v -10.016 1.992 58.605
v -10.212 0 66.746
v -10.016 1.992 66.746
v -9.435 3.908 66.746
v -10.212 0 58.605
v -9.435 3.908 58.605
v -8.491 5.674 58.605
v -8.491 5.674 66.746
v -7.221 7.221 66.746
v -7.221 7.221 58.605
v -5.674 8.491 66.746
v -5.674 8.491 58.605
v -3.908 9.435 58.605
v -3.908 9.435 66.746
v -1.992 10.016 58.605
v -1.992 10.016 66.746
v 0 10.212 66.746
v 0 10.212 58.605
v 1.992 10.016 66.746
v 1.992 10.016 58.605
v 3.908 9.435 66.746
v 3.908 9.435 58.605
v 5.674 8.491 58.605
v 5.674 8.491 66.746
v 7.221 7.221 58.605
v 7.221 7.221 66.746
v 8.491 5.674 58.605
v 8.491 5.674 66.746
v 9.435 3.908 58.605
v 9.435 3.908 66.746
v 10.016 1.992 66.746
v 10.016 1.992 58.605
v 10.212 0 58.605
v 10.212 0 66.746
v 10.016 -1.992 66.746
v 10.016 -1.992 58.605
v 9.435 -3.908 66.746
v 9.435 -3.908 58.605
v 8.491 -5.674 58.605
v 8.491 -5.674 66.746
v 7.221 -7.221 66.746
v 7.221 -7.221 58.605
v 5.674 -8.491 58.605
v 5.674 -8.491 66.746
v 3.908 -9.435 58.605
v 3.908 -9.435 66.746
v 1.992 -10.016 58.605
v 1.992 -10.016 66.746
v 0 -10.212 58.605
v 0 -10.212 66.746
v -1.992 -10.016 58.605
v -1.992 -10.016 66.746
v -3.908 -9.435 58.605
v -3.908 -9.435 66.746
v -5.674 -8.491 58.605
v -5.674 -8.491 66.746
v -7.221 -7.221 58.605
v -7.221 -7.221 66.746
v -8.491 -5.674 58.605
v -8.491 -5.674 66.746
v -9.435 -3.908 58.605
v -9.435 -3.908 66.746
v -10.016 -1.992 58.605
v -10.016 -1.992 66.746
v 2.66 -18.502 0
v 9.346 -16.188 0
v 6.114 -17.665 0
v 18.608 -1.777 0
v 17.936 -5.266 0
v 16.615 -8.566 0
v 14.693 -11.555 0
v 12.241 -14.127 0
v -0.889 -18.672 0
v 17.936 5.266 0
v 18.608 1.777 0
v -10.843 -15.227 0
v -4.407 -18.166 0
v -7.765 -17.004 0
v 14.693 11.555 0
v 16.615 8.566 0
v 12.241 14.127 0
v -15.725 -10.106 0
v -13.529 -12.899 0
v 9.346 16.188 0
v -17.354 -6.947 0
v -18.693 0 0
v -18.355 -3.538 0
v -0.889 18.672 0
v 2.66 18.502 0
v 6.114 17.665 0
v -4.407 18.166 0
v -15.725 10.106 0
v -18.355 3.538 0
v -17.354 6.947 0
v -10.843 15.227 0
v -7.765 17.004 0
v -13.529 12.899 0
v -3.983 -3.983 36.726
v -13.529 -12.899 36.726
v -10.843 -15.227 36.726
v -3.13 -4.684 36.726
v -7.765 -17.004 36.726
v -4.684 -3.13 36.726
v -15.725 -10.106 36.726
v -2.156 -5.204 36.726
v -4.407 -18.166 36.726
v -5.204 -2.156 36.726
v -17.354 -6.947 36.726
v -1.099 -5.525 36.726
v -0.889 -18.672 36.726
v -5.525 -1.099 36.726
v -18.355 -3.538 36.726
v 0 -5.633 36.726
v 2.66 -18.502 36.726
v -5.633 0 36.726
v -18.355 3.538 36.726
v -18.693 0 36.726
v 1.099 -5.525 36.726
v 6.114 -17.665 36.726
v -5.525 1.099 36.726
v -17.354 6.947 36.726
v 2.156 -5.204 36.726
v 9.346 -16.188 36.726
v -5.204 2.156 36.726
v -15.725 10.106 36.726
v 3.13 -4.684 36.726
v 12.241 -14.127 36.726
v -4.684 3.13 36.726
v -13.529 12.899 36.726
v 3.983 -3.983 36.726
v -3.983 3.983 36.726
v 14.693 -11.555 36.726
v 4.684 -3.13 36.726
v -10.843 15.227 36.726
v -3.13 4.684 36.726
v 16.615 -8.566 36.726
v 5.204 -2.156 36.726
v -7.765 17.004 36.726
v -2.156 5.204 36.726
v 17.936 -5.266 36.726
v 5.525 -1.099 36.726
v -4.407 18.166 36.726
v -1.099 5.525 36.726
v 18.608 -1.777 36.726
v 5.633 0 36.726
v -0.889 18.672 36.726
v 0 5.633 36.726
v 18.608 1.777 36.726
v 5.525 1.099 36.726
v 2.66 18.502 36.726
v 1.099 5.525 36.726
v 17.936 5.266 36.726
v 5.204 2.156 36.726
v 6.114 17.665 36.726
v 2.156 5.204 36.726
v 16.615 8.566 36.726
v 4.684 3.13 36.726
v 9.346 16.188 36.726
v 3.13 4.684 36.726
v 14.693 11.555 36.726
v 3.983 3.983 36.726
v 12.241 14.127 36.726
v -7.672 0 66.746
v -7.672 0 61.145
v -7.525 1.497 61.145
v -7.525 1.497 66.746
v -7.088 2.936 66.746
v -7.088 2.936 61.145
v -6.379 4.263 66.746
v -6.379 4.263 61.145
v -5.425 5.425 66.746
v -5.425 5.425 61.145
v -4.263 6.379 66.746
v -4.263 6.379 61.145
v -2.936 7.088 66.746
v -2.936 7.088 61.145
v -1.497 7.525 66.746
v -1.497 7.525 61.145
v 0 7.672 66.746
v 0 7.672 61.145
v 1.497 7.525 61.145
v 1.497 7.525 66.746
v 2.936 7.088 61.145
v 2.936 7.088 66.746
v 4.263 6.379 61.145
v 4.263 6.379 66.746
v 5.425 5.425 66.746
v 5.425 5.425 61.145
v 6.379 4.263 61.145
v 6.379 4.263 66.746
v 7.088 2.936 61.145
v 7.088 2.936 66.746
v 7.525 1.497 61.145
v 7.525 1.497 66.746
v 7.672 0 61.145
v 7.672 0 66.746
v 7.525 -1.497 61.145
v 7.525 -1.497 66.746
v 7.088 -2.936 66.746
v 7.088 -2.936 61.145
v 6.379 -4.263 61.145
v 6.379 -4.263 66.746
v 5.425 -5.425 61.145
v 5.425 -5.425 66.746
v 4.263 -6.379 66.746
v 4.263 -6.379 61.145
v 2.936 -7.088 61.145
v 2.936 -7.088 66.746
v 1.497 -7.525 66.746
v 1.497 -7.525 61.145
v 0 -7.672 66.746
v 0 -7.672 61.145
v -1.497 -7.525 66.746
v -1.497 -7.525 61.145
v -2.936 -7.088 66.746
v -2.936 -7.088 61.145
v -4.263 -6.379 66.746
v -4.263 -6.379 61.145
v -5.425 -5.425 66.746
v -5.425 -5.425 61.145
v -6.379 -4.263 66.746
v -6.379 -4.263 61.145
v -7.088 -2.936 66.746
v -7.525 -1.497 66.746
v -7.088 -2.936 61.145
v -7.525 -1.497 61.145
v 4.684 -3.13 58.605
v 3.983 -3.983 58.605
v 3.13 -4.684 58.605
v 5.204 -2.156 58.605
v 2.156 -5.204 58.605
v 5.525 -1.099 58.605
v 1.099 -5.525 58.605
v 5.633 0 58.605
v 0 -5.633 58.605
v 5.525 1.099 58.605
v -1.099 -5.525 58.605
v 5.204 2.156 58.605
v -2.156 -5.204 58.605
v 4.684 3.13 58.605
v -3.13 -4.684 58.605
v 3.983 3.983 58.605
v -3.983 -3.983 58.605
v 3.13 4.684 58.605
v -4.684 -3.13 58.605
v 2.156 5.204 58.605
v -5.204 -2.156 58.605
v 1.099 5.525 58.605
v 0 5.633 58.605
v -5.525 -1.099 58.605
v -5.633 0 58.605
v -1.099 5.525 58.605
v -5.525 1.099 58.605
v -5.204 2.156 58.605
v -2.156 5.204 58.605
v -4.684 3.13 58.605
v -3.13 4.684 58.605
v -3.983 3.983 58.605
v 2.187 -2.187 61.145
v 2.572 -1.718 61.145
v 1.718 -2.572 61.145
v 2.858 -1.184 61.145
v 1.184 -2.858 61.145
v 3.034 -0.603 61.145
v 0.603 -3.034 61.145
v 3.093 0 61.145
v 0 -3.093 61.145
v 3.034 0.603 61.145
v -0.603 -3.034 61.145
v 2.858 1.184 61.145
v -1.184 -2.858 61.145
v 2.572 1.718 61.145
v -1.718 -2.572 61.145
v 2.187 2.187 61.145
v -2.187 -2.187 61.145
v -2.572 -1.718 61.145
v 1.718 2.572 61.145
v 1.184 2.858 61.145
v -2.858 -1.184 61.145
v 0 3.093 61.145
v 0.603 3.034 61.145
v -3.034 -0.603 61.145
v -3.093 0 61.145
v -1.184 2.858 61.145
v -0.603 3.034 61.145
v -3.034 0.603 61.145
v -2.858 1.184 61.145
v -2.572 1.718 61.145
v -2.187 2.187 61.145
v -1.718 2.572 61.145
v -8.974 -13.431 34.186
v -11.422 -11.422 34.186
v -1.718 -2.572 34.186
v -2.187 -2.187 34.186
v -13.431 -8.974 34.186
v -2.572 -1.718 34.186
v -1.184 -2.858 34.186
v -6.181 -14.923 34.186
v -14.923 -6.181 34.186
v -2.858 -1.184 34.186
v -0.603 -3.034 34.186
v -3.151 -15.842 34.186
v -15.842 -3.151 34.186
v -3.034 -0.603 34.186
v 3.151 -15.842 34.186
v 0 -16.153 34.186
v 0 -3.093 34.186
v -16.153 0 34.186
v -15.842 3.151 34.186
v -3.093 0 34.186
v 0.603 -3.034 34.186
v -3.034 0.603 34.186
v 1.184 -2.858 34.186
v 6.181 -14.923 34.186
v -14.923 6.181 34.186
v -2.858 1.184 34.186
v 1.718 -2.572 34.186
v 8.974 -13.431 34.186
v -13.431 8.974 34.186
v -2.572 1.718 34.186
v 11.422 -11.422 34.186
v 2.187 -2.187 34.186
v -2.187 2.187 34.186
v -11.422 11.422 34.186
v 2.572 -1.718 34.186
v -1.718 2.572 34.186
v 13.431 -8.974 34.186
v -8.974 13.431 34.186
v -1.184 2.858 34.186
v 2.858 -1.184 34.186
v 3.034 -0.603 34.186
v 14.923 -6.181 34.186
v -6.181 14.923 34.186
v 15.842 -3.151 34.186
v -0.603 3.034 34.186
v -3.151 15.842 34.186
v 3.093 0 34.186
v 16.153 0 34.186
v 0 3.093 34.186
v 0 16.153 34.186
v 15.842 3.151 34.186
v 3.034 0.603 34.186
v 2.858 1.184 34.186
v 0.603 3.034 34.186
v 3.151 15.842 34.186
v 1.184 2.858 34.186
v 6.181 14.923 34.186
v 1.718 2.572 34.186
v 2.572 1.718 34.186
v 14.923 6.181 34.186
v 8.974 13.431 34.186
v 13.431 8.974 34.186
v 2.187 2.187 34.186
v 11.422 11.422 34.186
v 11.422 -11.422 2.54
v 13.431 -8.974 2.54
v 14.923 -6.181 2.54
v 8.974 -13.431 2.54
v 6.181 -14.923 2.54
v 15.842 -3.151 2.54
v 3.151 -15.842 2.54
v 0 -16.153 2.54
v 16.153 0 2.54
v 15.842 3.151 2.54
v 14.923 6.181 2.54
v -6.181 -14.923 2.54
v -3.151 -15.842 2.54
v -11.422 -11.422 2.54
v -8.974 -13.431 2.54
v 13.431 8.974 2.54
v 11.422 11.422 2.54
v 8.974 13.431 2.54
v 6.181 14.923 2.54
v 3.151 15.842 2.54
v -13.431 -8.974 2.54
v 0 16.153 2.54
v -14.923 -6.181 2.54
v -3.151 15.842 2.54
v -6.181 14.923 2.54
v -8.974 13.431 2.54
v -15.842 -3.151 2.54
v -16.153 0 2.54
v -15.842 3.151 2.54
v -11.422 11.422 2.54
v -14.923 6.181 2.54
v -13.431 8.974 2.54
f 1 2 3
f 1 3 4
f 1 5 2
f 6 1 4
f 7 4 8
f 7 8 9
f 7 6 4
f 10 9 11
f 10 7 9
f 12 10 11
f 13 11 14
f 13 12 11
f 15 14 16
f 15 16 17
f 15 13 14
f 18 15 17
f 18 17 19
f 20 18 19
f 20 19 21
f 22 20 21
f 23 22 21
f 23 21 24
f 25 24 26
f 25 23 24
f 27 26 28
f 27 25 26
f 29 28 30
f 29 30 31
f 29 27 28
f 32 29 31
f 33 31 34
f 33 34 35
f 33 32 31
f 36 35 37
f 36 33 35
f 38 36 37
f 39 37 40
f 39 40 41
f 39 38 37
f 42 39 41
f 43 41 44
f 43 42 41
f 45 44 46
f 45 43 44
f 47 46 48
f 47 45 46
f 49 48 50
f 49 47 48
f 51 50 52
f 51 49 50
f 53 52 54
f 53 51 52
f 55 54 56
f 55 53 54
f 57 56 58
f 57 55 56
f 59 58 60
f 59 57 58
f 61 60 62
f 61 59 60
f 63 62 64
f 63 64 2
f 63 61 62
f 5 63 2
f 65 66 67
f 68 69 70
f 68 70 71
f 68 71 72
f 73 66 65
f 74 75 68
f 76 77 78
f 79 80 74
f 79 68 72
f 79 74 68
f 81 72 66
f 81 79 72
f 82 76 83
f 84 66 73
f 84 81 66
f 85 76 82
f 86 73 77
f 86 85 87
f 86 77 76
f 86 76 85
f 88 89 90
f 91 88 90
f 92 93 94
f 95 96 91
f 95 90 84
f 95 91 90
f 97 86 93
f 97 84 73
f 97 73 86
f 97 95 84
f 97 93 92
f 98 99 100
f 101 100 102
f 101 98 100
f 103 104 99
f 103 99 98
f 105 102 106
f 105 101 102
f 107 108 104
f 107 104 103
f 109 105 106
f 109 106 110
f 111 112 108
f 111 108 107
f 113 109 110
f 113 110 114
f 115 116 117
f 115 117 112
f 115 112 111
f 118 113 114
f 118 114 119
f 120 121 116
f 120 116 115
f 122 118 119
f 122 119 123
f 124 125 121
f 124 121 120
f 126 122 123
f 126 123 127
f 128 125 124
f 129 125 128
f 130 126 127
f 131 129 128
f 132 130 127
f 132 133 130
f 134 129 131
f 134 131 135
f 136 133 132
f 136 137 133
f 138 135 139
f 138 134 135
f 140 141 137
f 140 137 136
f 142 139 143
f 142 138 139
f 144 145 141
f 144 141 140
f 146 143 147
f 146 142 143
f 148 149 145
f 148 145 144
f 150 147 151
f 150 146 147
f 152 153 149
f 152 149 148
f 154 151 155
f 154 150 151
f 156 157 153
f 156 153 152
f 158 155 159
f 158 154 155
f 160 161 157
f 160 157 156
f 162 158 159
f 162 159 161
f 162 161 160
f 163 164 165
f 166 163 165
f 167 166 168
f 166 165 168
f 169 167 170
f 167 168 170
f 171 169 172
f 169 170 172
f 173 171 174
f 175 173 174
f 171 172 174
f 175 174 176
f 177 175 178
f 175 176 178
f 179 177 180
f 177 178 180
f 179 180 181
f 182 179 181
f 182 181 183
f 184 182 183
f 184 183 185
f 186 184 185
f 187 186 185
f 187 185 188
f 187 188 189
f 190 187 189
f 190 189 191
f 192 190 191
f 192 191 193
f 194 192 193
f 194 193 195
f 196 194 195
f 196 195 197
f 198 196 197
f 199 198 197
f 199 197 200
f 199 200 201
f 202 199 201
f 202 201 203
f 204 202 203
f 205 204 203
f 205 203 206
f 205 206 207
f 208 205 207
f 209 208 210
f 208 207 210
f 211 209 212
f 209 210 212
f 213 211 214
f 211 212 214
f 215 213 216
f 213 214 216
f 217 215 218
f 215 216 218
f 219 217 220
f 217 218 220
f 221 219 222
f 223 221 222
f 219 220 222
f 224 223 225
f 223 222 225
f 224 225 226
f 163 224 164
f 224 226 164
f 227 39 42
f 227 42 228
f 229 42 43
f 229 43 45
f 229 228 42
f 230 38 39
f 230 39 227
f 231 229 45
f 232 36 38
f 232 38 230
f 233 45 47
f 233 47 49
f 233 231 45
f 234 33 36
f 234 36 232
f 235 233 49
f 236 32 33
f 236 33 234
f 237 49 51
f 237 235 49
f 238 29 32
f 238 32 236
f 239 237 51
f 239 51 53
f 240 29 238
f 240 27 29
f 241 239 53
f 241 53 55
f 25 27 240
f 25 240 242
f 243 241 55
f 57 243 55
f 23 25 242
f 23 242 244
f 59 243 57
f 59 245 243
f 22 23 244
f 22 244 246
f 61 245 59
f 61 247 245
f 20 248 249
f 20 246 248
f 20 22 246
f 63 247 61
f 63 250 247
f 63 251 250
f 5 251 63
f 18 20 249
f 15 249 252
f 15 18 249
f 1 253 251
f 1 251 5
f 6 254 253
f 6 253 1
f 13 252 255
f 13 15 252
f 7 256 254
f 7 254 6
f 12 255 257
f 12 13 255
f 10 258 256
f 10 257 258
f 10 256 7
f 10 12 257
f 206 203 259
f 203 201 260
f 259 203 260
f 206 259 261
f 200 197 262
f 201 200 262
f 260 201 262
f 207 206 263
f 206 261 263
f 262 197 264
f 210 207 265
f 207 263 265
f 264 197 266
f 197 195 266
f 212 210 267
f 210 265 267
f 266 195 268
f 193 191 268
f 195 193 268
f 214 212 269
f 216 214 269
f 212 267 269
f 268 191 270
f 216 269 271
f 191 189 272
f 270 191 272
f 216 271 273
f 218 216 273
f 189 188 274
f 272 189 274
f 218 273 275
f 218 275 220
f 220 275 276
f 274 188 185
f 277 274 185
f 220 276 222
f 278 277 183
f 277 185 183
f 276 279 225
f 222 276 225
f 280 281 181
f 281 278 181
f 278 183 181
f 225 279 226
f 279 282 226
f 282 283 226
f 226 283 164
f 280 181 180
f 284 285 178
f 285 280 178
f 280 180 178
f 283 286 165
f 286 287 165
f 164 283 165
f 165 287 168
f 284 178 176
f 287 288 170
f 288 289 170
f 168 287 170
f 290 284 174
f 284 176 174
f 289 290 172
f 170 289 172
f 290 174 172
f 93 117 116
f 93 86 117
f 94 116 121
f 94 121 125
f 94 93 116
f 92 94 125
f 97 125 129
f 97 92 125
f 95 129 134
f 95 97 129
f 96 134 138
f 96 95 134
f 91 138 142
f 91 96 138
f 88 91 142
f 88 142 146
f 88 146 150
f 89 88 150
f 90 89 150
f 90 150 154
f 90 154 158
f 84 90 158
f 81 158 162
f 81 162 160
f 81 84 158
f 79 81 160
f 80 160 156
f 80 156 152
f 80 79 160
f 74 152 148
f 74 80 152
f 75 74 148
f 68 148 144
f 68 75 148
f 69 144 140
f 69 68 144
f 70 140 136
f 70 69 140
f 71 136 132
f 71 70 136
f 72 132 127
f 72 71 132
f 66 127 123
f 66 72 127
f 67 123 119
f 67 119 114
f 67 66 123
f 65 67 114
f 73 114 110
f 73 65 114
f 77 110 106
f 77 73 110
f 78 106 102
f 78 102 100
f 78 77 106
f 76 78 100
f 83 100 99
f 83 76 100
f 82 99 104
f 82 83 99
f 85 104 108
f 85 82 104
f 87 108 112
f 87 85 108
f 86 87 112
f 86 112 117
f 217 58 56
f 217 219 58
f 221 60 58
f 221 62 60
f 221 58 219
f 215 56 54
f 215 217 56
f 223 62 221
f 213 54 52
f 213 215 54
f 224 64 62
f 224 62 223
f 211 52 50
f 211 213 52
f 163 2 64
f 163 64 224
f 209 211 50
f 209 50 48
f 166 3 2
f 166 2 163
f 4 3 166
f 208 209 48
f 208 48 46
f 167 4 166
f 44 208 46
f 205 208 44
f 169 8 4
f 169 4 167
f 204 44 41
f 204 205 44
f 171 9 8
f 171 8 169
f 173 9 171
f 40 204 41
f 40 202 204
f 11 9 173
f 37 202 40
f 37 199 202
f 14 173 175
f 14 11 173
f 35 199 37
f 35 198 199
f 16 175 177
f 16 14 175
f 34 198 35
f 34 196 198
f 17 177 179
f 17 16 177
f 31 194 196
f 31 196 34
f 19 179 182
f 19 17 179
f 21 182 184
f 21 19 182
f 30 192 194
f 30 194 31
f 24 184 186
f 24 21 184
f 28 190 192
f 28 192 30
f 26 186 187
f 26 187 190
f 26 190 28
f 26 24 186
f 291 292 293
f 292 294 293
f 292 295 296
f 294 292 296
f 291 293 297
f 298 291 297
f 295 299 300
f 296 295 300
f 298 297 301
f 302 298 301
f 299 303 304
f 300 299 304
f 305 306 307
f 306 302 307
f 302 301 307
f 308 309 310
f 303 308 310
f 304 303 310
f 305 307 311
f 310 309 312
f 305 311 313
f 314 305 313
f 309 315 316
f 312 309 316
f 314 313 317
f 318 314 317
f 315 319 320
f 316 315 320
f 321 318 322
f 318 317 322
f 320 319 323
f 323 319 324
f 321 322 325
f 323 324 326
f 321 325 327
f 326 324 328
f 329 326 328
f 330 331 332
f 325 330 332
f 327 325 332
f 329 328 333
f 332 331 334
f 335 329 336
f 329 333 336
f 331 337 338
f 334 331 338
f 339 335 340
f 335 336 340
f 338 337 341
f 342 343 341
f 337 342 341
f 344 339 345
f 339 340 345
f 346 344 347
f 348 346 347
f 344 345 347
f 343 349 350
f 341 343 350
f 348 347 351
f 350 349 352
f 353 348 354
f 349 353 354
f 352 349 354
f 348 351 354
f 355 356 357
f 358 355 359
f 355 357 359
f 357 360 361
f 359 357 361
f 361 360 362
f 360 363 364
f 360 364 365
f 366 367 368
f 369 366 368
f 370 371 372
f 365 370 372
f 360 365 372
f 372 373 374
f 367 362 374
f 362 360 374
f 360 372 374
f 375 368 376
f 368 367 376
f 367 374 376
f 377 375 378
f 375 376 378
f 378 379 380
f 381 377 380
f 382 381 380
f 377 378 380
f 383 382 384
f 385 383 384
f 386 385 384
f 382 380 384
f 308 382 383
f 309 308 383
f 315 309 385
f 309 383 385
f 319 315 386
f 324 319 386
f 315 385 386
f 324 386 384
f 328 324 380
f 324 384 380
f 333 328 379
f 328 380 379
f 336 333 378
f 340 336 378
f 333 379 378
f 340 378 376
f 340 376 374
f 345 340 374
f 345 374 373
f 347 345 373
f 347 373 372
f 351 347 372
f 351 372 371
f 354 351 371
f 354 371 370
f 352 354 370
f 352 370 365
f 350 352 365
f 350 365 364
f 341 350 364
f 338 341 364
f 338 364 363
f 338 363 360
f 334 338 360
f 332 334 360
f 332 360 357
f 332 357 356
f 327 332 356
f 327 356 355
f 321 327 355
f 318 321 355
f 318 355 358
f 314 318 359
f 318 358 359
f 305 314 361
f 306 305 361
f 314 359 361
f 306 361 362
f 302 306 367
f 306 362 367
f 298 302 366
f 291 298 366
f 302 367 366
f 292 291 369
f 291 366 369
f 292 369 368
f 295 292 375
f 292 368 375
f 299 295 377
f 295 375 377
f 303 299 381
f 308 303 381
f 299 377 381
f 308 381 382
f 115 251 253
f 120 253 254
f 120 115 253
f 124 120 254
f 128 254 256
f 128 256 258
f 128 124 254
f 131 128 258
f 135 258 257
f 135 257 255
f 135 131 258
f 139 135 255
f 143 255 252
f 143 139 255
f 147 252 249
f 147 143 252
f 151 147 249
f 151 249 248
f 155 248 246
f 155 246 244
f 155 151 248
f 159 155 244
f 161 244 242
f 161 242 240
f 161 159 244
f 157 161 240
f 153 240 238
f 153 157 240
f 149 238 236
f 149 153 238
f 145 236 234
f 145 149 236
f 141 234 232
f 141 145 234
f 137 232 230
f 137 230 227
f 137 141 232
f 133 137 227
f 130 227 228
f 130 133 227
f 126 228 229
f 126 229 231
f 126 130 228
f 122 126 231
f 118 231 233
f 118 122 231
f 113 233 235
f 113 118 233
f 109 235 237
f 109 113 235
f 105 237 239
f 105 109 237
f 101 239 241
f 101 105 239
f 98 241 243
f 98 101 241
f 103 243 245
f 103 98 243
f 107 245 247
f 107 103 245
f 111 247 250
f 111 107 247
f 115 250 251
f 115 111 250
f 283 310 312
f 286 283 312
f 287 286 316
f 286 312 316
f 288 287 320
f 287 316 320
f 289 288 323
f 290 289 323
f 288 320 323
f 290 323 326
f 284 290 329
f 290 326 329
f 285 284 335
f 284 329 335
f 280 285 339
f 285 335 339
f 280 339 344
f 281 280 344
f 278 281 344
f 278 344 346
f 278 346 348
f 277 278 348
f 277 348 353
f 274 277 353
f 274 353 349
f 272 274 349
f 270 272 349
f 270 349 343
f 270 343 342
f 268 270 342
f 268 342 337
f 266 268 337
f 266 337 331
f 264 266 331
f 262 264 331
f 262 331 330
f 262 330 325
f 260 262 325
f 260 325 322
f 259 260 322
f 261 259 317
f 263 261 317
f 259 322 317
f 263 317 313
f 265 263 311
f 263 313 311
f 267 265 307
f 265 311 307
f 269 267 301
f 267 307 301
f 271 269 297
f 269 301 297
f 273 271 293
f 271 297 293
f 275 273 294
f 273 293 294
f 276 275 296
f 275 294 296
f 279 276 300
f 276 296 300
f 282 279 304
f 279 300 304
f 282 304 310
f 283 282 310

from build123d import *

# Parameters (mm, degrees)
F2_T = -2.54


with BuildPart() as f1:
    # F0 (on Front) → F1 (revolve)
    with BuildSketch(Plane.XZ):
        Polygon((0, 0), (0, 66.7458474636), (-10.2124884725, 66.7458474636), (-10.2124884725, 58.6048029363), (-5.633150693, 58.6048029363), (-5.633150693, 36.7257446051), (-18.6927430332, 36.7257446051), (-18.6927430332, 0), align=None)
    revolve(axis=Axis((0, 0, 33.3729237318), (0, 0, -1)))

    # F2
    f2_openings = [f1.faces().sort_by_distance(p)[0] for p in [
        (0, 0, 66.745847),
    ]]
    offset(amount=F2_T, openings=f2_openings, kind=Kind.INTERSECTION)


solid = f1.part
